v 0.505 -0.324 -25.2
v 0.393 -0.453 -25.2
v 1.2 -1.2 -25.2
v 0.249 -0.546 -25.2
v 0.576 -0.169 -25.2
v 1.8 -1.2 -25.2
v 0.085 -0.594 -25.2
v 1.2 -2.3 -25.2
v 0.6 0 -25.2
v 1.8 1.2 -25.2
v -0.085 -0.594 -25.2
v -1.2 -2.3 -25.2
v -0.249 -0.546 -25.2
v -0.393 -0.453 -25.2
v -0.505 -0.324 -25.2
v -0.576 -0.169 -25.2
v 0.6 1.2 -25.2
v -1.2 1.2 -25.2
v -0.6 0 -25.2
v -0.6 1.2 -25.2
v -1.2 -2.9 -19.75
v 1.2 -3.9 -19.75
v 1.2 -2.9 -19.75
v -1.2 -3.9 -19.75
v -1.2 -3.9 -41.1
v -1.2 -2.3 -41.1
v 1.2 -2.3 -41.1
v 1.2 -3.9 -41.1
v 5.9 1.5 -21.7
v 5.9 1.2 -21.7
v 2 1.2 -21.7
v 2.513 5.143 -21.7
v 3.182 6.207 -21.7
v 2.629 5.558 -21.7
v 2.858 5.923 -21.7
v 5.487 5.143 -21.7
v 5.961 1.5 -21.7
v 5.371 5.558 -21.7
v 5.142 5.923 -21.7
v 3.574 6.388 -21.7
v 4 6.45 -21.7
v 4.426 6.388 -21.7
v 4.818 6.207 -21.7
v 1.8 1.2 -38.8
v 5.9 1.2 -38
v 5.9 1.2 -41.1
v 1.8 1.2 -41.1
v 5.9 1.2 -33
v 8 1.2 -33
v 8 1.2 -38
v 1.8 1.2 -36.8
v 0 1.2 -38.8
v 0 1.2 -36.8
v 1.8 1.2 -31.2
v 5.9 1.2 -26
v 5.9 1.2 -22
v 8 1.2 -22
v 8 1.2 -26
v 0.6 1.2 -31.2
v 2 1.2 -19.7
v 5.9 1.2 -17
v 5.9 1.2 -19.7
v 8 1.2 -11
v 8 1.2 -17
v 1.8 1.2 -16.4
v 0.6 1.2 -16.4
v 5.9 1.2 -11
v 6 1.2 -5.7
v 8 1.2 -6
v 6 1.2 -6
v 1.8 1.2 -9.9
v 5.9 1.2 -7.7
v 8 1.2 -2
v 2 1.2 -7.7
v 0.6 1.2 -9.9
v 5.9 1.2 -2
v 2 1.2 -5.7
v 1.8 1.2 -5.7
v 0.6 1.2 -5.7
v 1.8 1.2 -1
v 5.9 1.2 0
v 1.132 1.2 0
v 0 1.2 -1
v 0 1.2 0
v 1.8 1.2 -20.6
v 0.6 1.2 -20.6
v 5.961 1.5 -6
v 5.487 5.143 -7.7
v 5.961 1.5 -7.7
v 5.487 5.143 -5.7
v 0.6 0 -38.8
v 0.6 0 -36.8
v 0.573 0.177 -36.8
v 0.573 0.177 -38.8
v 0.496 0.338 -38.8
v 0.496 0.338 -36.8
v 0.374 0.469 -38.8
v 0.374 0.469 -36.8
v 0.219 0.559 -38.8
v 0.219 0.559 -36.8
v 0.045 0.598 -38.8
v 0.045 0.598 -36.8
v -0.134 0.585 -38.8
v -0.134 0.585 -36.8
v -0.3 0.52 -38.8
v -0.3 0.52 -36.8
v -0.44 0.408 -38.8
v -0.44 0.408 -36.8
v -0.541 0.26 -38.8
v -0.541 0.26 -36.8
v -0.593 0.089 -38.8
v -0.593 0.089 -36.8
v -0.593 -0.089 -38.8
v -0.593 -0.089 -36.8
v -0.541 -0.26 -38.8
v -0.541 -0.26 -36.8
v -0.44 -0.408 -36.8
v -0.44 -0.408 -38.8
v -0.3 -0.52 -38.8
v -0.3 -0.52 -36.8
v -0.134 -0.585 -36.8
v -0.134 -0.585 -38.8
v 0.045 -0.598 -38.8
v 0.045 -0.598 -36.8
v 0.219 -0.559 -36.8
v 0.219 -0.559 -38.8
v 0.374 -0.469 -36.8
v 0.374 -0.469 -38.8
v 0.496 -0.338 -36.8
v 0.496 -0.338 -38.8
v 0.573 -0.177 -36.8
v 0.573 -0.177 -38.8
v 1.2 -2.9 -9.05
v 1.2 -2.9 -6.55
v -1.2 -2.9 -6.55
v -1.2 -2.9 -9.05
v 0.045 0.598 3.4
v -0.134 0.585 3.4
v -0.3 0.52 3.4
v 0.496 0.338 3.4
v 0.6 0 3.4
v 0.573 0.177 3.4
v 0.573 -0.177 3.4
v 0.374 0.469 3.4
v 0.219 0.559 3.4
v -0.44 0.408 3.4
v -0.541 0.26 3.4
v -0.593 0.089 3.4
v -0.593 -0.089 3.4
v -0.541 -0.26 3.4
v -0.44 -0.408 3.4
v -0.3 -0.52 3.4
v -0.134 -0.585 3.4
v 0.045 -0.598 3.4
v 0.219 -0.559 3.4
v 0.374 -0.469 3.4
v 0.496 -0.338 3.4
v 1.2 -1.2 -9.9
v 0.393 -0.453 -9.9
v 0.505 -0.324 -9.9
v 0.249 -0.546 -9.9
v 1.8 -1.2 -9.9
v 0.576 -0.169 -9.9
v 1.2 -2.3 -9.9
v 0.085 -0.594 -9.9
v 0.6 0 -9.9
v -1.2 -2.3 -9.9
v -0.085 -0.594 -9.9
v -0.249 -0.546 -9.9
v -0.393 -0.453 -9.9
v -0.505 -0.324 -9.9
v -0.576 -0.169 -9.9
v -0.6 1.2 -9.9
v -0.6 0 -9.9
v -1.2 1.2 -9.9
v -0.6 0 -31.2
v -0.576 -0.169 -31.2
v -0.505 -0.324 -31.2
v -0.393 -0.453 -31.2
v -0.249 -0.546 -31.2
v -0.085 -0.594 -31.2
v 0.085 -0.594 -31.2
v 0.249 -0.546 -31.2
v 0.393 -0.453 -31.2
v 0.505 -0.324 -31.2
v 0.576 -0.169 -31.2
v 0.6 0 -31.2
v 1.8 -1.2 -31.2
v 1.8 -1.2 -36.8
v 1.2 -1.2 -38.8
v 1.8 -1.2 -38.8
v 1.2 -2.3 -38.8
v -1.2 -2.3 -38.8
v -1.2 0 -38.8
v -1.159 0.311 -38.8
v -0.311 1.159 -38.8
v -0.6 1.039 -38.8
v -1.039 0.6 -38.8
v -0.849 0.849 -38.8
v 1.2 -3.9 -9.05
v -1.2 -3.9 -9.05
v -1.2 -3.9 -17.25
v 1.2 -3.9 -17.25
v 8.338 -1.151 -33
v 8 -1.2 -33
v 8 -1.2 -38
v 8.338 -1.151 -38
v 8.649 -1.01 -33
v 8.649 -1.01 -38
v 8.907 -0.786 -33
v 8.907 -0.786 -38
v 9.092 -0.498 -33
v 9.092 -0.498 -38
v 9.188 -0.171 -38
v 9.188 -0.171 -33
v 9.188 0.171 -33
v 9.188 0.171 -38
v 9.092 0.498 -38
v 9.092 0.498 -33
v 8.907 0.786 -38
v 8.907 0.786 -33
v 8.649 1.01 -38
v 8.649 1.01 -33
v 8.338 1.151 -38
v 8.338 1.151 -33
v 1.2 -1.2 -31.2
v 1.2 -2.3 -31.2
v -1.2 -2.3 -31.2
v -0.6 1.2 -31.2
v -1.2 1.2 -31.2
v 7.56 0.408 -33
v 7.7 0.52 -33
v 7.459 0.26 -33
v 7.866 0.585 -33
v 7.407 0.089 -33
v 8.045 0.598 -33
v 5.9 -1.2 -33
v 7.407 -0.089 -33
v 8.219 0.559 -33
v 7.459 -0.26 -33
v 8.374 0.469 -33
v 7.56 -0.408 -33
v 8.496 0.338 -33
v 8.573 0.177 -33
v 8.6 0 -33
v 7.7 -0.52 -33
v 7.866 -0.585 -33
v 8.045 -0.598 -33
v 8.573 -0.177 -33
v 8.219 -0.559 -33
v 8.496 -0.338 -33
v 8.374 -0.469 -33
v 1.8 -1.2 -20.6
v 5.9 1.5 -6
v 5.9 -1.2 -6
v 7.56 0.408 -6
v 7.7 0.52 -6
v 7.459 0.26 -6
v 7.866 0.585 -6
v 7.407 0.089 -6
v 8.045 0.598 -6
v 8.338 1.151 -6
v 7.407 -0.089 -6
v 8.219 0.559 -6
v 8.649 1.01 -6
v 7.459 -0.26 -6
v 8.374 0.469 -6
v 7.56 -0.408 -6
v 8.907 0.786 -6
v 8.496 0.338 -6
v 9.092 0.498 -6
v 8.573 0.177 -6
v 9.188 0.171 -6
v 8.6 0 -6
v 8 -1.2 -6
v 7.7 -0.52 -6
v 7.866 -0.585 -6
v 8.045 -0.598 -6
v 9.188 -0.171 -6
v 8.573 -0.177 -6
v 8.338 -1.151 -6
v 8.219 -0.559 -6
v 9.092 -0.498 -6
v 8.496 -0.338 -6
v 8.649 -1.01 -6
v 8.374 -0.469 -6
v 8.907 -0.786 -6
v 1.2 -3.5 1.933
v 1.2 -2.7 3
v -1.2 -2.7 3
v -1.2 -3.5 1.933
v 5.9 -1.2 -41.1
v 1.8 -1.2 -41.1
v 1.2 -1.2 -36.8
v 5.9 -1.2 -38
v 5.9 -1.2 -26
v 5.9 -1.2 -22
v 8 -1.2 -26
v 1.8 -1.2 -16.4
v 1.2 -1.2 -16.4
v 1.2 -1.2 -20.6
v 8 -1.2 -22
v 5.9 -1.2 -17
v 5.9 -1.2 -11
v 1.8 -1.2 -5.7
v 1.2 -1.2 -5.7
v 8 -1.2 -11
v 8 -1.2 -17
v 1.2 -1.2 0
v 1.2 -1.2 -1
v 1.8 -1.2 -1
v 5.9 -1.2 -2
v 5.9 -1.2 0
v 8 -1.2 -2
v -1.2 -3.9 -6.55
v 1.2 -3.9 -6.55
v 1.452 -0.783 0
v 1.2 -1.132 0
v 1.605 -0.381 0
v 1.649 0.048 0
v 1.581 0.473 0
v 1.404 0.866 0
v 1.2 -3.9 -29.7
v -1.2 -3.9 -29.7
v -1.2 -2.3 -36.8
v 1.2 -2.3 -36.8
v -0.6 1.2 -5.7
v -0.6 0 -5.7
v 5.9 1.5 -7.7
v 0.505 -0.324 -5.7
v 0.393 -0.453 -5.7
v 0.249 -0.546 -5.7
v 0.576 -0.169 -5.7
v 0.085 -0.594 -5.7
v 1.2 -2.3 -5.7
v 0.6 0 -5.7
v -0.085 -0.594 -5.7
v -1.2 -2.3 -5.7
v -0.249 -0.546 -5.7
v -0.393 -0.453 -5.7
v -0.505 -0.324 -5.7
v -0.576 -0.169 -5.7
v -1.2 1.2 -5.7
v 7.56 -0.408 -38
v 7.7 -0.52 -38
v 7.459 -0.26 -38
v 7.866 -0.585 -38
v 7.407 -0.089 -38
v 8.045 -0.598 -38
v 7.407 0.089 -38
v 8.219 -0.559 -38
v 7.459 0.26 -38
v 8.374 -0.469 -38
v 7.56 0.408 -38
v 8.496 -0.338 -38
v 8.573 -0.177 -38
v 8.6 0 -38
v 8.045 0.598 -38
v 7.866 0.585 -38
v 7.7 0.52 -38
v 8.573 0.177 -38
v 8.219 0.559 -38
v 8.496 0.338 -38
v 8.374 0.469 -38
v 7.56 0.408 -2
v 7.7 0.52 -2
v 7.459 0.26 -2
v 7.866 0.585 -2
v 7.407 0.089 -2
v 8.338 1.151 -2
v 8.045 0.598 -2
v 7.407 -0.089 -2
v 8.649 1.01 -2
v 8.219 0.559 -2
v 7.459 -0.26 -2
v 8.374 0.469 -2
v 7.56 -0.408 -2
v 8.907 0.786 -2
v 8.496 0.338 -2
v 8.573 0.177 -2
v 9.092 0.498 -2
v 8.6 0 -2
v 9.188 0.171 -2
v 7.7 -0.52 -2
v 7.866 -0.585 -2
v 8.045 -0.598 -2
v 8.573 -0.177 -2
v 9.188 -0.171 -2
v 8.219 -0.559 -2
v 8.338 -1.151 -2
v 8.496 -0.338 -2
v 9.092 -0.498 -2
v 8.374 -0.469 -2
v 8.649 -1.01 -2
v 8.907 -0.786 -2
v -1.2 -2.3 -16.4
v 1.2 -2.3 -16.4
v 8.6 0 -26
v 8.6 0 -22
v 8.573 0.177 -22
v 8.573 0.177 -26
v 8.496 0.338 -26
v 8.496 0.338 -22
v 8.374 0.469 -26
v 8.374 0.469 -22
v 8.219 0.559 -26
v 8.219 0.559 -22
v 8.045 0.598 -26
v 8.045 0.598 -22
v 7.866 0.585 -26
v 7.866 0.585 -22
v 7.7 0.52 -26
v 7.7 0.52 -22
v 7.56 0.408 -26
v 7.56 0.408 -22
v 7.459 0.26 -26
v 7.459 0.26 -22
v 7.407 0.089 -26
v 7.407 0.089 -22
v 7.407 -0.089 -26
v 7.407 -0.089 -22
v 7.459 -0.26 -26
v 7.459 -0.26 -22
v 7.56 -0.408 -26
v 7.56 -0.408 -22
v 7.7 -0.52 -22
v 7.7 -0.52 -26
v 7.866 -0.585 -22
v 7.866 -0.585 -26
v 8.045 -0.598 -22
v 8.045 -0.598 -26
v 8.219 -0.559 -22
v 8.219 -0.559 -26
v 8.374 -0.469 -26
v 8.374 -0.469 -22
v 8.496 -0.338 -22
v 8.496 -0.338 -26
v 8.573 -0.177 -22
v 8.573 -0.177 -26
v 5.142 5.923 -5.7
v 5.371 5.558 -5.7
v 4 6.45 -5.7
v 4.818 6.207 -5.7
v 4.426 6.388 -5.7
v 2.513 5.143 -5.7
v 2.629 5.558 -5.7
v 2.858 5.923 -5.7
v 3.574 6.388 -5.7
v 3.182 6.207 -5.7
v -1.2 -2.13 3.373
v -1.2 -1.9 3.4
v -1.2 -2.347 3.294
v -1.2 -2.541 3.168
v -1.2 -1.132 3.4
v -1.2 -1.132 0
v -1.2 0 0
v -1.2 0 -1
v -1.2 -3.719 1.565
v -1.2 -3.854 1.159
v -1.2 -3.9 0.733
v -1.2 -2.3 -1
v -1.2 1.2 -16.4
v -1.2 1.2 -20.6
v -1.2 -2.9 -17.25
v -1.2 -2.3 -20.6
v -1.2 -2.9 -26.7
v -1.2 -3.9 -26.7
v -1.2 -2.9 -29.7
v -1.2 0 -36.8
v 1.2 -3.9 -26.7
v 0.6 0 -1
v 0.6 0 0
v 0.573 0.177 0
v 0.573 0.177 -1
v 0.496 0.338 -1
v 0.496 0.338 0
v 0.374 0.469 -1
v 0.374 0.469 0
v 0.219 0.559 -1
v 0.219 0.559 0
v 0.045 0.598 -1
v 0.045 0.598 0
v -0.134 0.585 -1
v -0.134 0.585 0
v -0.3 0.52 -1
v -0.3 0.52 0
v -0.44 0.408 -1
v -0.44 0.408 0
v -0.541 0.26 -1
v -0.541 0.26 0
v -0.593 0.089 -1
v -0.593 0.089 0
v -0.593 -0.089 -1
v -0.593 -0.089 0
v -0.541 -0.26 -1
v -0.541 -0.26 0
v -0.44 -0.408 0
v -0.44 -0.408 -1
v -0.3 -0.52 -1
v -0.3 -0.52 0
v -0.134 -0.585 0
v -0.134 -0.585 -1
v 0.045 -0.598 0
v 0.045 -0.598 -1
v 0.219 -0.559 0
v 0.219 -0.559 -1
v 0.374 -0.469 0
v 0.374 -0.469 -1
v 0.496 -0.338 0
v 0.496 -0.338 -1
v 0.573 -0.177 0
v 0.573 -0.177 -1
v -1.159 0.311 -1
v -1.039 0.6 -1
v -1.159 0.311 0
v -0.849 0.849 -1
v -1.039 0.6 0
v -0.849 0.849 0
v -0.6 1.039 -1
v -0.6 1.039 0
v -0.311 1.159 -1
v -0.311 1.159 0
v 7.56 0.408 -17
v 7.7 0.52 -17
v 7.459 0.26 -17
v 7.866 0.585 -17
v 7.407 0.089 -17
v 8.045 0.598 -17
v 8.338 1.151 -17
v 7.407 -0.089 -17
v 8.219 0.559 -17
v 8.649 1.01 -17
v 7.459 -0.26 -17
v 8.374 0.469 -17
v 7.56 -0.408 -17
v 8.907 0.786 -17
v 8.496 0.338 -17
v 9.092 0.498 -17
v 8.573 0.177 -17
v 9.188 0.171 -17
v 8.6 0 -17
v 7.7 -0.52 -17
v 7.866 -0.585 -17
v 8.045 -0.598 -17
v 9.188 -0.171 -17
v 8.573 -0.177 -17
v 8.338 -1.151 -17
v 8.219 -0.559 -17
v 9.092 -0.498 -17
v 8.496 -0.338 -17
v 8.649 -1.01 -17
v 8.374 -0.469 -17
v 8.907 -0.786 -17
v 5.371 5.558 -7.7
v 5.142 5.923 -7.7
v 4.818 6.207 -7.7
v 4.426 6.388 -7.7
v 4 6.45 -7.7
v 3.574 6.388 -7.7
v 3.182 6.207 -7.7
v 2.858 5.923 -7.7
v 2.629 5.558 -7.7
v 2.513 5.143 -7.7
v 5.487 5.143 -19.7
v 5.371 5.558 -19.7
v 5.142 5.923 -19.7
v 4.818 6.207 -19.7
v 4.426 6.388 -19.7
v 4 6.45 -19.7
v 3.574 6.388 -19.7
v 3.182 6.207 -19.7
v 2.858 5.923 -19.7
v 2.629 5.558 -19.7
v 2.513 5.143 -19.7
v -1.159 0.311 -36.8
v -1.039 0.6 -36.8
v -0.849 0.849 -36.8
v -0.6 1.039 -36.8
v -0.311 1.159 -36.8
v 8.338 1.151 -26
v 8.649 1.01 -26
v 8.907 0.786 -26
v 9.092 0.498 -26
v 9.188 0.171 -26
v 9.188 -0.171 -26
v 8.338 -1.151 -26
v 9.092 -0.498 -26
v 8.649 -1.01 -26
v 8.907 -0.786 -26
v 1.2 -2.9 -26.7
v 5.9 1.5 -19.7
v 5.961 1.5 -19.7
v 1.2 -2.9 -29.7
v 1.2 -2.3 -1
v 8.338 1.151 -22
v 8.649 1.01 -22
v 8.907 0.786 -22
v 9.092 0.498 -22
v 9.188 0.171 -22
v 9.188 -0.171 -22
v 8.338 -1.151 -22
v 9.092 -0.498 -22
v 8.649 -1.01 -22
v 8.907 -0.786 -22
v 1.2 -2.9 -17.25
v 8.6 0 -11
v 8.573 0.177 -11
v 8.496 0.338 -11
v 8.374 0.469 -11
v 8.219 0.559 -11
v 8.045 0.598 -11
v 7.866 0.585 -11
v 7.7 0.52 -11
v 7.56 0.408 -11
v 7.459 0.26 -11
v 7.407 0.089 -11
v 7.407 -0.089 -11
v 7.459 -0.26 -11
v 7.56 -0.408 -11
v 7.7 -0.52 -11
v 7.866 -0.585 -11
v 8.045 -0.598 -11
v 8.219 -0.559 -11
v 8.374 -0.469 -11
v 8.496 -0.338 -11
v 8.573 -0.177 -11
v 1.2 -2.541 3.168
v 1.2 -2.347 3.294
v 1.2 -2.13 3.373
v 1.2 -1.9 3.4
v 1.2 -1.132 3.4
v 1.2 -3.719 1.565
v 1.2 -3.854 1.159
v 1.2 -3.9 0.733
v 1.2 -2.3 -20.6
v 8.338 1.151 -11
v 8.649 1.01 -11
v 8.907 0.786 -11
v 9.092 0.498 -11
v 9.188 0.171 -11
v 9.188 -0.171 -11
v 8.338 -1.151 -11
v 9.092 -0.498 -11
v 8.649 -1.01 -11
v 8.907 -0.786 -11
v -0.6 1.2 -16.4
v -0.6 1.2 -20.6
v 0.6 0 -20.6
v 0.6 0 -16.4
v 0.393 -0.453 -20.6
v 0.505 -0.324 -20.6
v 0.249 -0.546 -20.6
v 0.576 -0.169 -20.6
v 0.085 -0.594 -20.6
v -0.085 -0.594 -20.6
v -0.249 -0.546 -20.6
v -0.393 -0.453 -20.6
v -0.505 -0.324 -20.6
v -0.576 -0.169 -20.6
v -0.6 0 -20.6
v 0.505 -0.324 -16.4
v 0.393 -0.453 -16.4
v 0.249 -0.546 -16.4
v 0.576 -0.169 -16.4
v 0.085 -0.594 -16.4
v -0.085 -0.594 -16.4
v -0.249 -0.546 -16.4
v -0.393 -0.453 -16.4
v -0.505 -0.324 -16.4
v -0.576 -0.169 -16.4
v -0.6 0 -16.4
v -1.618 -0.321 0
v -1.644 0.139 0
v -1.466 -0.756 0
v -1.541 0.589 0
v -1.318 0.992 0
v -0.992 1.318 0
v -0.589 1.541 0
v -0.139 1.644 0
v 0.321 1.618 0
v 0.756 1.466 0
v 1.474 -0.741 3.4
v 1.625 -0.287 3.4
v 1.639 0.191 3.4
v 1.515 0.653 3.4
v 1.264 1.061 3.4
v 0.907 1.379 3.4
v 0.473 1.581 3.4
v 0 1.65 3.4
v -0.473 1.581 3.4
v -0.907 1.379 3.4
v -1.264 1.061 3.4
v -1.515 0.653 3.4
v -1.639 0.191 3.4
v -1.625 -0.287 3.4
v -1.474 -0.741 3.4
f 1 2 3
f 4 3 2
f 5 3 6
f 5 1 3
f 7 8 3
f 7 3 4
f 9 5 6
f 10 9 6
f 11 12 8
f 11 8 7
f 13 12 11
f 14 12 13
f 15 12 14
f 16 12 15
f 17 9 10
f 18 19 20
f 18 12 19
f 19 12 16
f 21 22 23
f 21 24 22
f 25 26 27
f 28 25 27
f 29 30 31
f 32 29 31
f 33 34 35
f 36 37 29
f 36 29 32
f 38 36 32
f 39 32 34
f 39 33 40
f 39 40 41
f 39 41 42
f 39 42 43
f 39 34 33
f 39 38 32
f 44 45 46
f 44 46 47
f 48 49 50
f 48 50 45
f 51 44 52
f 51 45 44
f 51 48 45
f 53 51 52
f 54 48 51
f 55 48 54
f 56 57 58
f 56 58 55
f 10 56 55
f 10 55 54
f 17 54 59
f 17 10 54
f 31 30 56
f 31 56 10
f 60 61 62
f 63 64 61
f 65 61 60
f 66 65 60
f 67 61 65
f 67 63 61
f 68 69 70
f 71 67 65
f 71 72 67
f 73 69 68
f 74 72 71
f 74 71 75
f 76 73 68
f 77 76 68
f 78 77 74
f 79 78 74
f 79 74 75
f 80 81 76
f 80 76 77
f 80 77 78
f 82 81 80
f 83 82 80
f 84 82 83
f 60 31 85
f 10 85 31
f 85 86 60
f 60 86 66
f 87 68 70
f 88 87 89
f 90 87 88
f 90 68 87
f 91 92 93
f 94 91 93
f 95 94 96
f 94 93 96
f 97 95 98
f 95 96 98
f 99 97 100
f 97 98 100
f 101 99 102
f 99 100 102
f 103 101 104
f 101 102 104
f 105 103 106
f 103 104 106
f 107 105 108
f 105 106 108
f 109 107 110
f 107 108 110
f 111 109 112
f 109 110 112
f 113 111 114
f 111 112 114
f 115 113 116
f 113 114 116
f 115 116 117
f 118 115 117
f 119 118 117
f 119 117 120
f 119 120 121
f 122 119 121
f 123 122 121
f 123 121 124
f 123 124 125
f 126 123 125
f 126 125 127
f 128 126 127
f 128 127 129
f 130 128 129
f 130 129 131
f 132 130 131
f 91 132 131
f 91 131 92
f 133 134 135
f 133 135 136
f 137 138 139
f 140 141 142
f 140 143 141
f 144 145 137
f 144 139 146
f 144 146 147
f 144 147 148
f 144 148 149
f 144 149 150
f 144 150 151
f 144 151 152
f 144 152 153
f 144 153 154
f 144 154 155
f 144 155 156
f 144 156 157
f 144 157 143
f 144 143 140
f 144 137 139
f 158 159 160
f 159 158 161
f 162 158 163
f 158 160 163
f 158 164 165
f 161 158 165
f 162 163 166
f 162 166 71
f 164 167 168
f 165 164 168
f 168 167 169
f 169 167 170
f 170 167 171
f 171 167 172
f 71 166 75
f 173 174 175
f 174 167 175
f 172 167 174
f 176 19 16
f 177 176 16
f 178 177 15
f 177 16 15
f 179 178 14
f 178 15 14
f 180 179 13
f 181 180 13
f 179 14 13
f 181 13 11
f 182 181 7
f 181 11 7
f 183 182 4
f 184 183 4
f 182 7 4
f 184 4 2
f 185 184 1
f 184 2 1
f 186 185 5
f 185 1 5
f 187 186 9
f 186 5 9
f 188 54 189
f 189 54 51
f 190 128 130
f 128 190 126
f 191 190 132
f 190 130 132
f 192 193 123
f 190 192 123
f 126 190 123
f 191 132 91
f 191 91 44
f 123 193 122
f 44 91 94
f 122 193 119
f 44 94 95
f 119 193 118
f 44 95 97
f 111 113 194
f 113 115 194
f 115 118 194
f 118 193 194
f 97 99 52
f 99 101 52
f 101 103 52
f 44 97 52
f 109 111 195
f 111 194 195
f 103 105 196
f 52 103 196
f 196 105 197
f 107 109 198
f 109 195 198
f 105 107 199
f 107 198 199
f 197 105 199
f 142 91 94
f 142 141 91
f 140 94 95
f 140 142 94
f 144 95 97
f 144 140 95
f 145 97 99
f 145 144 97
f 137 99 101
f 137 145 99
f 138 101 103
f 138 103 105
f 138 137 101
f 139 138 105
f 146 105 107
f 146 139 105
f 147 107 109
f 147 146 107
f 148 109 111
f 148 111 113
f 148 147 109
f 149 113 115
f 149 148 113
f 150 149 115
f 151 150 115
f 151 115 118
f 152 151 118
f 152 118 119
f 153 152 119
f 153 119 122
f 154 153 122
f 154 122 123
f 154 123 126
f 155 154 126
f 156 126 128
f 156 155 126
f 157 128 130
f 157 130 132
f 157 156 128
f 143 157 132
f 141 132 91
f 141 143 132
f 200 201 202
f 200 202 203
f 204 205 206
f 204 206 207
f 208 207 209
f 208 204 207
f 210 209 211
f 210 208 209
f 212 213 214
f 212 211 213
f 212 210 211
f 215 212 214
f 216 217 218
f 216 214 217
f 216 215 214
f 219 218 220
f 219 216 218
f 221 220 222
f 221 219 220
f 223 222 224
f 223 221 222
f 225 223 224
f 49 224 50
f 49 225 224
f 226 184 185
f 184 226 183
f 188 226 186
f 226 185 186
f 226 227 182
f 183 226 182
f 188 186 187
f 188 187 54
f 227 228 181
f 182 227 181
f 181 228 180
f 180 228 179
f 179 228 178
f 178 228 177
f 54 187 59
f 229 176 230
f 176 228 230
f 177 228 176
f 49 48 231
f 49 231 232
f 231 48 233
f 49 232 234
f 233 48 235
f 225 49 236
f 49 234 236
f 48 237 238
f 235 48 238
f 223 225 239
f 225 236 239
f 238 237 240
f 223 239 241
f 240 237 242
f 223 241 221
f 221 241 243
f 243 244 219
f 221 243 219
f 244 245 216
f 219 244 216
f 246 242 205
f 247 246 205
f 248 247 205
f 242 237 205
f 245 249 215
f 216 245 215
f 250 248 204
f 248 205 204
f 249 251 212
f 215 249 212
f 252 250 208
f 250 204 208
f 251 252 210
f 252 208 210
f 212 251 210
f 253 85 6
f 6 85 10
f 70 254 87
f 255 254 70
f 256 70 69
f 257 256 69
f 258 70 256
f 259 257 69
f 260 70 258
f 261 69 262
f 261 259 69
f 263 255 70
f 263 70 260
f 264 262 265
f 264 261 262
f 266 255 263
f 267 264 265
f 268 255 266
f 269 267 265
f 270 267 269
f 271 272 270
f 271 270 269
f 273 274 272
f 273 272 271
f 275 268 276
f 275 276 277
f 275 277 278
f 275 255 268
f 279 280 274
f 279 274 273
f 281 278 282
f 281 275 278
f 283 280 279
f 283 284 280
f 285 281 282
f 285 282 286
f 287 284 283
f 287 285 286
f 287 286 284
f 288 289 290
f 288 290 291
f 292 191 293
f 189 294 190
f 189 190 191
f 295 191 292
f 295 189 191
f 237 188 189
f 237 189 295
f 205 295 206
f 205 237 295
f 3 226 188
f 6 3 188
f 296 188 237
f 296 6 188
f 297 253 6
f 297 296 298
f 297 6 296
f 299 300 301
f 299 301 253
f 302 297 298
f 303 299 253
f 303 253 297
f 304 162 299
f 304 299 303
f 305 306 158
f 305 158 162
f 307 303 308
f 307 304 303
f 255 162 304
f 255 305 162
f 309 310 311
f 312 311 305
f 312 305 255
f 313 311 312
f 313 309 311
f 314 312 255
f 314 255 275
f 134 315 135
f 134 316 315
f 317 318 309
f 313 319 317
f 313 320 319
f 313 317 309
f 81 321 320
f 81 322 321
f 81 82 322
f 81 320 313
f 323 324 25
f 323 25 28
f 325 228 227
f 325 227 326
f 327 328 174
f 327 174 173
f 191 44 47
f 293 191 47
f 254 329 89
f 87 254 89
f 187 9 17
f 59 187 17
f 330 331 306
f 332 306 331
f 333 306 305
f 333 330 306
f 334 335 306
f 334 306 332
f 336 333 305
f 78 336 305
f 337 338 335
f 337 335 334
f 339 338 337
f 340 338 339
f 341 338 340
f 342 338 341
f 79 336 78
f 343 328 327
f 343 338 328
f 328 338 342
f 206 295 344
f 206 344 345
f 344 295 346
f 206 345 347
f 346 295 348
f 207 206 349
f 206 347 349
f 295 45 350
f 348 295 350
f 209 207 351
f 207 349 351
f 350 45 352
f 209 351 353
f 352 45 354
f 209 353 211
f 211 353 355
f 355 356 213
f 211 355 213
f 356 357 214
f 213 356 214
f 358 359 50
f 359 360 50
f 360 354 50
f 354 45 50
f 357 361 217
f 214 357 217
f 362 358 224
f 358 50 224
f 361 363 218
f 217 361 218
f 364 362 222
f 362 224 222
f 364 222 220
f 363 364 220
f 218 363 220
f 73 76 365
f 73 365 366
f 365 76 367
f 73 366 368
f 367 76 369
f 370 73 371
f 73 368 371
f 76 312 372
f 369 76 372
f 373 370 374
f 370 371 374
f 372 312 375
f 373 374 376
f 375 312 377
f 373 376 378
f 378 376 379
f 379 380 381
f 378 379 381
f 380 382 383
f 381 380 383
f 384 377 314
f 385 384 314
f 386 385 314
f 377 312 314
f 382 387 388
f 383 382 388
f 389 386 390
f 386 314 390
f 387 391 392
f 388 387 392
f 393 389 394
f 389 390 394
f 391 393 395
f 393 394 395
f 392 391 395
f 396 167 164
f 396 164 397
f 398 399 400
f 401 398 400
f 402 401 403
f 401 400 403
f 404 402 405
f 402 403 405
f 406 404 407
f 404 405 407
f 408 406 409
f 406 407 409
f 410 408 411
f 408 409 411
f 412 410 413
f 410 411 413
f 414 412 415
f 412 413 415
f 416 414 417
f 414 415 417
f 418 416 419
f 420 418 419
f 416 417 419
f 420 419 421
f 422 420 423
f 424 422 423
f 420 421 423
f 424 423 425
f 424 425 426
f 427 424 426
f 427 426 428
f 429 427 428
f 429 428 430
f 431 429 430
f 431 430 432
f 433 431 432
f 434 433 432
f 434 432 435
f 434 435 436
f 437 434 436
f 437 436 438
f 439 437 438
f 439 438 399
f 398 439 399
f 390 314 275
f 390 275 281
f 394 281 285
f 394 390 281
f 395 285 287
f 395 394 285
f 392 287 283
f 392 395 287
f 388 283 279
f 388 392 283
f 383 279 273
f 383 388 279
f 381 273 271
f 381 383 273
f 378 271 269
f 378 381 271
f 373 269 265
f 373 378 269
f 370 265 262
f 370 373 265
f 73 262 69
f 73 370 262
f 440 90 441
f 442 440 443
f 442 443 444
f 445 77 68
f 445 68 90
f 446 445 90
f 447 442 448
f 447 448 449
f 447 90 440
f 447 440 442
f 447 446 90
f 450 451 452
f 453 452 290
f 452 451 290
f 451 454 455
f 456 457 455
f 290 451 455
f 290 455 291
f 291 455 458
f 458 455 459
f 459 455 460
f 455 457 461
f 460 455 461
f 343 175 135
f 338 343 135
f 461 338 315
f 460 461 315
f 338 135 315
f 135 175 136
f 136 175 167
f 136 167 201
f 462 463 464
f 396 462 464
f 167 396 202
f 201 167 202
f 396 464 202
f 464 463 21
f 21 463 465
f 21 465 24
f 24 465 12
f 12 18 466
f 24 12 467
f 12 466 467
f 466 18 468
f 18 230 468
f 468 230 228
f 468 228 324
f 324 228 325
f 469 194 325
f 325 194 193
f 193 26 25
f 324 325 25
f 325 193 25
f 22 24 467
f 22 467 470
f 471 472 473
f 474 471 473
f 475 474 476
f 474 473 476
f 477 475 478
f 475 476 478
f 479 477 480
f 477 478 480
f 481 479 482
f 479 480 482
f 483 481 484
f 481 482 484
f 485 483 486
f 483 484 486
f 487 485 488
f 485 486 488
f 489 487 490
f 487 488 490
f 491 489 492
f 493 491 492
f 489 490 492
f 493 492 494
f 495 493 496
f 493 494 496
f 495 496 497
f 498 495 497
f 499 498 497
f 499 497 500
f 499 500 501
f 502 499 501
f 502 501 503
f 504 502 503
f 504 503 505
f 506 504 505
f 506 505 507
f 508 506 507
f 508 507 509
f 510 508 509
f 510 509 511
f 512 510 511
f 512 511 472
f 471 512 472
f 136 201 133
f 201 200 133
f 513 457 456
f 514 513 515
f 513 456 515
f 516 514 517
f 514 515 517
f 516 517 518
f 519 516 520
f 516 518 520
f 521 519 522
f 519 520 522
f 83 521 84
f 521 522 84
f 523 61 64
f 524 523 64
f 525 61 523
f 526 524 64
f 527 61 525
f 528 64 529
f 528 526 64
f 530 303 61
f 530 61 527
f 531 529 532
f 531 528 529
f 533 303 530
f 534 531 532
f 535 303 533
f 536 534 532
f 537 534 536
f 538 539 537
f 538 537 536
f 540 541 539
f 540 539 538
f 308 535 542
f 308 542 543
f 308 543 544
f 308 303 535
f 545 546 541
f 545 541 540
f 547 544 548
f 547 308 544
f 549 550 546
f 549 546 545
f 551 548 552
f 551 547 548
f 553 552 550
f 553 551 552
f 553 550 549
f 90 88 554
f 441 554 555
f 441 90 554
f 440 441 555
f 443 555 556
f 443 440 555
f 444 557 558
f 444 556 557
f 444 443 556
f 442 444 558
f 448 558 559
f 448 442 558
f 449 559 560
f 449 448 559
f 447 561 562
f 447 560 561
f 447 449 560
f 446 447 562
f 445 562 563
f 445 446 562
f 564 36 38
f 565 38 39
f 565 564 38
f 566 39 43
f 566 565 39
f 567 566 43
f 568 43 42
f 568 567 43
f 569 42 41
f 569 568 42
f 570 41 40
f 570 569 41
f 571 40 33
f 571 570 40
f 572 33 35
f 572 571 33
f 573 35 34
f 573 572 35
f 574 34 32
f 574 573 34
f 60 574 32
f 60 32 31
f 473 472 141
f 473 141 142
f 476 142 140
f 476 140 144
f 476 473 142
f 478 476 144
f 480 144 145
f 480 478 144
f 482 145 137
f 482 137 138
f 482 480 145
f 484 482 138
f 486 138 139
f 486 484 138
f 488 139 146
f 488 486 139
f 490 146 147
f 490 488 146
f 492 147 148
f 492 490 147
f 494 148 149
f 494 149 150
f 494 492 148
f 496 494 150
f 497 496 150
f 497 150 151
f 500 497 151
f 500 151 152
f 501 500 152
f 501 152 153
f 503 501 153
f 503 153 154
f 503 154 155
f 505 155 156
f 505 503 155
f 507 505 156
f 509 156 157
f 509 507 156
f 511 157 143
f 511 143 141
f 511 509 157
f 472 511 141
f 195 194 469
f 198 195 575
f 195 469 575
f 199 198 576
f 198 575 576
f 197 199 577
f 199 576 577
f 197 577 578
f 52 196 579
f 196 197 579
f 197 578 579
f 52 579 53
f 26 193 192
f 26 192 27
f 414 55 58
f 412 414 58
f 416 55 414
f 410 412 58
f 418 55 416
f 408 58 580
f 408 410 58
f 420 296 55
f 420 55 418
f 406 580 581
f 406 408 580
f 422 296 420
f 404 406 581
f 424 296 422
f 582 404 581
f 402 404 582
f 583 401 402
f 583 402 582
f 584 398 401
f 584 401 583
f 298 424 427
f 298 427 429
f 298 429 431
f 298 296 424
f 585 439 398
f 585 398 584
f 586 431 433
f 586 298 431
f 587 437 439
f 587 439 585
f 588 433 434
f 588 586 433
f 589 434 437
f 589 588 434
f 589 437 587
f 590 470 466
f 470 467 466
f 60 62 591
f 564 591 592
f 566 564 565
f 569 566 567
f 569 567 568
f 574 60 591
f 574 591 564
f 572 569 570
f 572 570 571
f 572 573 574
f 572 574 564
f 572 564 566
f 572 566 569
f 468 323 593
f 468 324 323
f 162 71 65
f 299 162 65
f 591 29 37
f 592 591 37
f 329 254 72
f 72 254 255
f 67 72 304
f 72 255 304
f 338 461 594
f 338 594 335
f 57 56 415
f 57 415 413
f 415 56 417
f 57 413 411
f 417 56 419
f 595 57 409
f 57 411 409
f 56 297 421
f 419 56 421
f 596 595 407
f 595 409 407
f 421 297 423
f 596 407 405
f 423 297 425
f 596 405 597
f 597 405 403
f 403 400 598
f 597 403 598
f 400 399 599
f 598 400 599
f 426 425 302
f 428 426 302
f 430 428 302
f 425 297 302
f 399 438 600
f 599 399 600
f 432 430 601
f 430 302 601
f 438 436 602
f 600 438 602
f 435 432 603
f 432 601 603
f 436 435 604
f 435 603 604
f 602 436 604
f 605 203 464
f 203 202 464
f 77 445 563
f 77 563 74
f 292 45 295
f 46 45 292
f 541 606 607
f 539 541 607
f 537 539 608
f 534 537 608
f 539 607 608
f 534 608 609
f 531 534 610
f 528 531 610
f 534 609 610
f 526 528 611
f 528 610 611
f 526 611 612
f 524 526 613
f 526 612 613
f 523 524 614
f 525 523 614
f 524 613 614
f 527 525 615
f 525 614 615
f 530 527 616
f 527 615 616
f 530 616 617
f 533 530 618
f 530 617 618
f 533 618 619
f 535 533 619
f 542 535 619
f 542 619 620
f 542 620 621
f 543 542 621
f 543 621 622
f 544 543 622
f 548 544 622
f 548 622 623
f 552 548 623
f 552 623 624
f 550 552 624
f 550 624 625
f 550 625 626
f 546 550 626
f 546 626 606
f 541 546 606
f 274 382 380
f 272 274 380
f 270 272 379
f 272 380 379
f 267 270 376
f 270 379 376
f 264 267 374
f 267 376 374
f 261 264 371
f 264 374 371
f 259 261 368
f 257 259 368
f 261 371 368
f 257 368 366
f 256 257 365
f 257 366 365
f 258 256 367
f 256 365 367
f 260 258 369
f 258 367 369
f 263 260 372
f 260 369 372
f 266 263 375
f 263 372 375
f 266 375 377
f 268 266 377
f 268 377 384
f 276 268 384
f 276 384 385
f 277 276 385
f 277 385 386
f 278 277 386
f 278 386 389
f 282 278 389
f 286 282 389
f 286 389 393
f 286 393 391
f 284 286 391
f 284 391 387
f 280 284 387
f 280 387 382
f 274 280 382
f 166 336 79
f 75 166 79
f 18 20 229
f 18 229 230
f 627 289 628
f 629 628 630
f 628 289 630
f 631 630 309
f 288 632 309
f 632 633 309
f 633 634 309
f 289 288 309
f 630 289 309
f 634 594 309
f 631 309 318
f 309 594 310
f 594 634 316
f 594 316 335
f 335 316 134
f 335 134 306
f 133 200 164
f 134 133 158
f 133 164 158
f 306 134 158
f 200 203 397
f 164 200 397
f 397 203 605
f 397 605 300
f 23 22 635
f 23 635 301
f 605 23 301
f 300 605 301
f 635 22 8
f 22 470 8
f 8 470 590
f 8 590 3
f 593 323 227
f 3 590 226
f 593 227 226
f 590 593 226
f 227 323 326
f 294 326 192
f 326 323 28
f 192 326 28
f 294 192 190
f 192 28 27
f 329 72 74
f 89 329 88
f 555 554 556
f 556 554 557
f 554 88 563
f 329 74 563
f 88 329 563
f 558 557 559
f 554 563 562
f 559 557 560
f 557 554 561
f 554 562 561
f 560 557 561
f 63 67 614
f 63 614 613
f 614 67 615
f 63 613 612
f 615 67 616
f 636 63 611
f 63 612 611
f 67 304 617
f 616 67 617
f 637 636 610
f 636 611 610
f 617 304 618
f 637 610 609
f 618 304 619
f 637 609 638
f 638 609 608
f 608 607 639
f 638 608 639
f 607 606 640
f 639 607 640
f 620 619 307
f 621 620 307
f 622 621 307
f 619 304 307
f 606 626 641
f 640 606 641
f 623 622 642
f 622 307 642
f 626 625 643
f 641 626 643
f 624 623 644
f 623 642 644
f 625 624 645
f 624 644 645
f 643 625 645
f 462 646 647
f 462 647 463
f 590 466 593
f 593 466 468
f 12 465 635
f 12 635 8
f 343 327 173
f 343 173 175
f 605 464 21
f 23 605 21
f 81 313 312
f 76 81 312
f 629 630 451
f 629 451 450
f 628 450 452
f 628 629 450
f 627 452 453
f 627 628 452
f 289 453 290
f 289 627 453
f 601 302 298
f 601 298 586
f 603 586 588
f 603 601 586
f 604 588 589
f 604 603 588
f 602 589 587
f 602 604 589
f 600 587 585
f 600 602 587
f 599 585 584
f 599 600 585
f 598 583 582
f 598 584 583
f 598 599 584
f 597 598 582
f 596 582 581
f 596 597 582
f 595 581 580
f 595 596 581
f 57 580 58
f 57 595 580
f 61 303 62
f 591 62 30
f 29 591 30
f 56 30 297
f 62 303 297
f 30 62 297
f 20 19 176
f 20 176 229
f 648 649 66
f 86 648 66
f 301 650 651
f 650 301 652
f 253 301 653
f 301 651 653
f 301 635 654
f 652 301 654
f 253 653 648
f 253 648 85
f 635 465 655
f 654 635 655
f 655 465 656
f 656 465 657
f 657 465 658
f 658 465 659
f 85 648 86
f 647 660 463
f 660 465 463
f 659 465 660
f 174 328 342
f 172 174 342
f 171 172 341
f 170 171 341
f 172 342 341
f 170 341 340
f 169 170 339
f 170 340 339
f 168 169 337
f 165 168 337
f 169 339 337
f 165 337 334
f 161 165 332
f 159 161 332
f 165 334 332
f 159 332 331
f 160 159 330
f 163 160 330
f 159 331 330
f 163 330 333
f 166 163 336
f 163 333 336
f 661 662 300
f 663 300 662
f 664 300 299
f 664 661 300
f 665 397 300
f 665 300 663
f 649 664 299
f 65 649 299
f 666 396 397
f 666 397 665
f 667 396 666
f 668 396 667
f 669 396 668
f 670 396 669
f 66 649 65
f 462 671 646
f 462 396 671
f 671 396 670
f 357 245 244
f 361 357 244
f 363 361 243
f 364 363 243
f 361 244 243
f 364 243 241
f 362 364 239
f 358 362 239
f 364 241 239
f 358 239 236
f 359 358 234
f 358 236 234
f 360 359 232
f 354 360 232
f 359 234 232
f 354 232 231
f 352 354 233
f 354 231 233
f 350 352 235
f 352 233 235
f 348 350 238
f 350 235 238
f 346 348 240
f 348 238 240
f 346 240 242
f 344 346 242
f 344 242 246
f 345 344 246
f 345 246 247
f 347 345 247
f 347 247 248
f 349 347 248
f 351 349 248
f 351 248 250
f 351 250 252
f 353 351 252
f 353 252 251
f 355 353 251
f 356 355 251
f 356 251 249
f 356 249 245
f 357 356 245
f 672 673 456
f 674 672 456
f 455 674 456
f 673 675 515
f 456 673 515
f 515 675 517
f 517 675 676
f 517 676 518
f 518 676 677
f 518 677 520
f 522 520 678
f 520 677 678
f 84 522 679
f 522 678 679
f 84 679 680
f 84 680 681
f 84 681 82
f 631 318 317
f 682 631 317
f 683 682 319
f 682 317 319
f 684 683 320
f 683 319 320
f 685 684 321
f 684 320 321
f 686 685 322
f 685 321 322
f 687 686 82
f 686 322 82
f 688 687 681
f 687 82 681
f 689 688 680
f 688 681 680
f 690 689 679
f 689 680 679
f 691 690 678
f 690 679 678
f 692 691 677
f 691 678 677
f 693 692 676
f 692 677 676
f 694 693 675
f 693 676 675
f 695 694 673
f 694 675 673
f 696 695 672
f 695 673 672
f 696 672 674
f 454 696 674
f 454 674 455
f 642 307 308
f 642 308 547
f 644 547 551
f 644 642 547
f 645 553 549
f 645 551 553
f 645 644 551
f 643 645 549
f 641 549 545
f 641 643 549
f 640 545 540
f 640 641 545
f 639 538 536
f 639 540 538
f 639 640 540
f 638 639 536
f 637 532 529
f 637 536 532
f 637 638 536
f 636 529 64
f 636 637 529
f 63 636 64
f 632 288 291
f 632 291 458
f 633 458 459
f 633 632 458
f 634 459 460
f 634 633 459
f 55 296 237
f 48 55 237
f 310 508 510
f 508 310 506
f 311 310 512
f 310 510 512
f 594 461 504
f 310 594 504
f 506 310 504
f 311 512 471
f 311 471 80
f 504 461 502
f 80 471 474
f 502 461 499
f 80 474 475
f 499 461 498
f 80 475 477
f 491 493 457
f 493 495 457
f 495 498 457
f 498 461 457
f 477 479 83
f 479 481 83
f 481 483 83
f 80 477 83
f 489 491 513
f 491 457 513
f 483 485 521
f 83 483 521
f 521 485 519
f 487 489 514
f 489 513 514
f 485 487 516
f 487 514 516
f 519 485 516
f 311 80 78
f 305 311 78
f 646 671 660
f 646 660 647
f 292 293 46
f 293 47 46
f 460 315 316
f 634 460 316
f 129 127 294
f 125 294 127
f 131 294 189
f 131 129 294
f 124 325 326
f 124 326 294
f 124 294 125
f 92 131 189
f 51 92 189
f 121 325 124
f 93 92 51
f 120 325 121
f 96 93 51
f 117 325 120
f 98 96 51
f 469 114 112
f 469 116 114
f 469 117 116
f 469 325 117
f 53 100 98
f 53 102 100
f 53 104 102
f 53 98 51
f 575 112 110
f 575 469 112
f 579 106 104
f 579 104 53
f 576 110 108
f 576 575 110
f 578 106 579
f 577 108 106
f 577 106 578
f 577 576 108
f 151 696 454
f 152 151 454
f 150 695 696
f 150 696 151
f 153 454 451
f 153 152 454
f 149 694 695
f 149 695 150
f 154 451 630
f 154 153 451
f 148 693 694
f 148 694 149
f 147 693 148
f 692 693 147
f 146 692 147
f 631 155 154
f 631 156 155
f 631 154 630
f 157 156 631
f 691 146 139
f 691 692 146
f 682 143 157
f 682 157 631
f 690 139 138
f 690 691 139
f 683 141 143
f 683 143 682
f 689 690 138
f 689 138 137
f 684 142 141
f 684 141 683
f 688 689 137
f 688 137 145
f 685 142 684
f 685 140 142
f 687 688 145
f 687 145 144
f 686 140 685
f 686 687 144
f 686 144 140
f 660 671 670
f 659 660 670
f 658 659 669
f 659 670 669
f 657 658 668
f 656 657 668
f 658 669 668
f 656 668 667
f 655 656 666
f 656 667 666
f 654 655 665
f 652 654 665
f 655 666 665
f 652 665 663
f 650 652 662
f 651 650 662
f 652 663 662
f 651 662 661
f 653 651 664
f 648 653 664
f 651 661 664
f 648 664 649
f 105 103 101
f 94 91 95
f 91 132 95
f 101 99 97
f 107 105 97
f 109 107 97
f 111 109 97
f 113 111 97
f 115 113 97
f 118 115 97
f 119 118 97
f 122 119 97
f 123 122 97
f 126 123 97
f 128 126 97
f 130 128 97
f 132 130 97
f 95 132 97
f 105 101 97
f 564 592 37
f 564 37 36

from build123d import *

# Parameters (mm, degrees)
SKETCH_1_R           = 0.6
EXTRUDE_1_DEPTH      = 41.1
SKETCH_2_W           = 5.7
SKETCH_2_H           = 5.25
SKETCH_2_W_2         = 12
SKETCH_2_W_3         = 19.4
CUT_EXTRUDE_1_DEPTH  = 9.75
CUT_EXTRUDE_START    = -1.2
SKETCH_6_W           = 4.7
SKETCH_6_H           = 3.5
SKETCH_6_W_2         = 6.5
SKETCH_6_W_3         = 4.6
SKETCH_6_W_4         = 5.6
SKETCH_6_W_5         = 2.3
CUT_EXTRUDE_4_DEPTH  = 3
CUT_EXTRUDE_5_DEPTH  = 3
CUT_EXTRUDE_START_2  = -36.8
CUT_EXTRUDE_6_DEPTH  = 3
CUT_EXTRUDE_START_3  = -5.7
SKETCH_11_W          = 1.2
SKETCH_11_H          = 1.2
CUT_EXTRUDE_7_DEPTH  = 27
SKETCH_12_W          = 3
SKETCH_12_H          = 4.320930259
SKETCH_12_W_2        = 2.5
CUT_EXTRUDE_8_DEPTH  = 3.5
SKETCH_13_W          = 3.3
SKETCH_13_H          = 2
SKETCH_13_H_2        = 5
SKETCH_13_H_3        = 7
SKETCH_13_H_4        = 3.1
CUT_EXTRUDE_9_DEPTH  = 1.5
SKETCH_14_R          = 1.65
SKETCH_14_R_2        = 0.6
EXTRUDE_2_DEPTH      = 3.4
CUT_EXTRUDE_10_DEPTH = 1.7
SKETCH_17_R          = 0.6
EXTRUDE_3_DEPTH      = 3.4
EXTRUDE_3_DEPTH_BACK = 38.8


with BuildPart() as part:
    # 草图1 → 凸台-拉伸1 (new body)
    with BuildSketch(Plane.XY):
        with BuildLine():
            Line((2, 1.2), (-1.2, 1.2))
            Line((-1.2, 1.2), (-1.2, -3.9))
            Line((-1.2, -3.9), (1.2, -3.9))
            Line((1.2, -3.9), (1.2, -1.2))
            Line((1.2, -1.2), (8, -1.2))
            ThreePointArc((8, -1.2), (9.2, 0), (8, 1.2))
            Line((8, 1.2), (6, 1.2))
            Line((6, 1.2), (5.487489304, 5.143327629))
            ThreePointArc((5.487489304, 5.143327629), (4, 6.45), (2.512510696, 5.143327629))
            Line((2.512510696, 5.143327629), (2, 1.2))
        make_face()
        Circle(SKETCH_1_R, mode=Mode.SUBTRACT)
        with Locations((8, 0)):
            Circle(SKETCH_1_R, mode=Mode.SUBTRACT)
    extrude(amount=-EXTRUDE_1_DEPTH)

    # 草图2 → 切除-拉伸1 (cut, symmetric)
    with BuildSketch(Plane(origin=(0, 0, 0), x_dir=(0, 0, -1), z_dir=(1, 0, 0))):
        with Locations((2.85, 3.825)):
            Rectangle(SKETCH_2_W, SKETCH_2_H)
        with Locations((13.7, 3.825)):
            Rectangle(SKETCH_2_W_2, SKETCH_2_H)
        with Locations((31.4, 3.825)):
            Rectangle(SKETCH_2_W_3, SKETCH_2_H)
    extrude(amount=CUT_EXTRUDE_1_DEPTH, both=True, mode=Mode.SUBTRACT)

    # 草图6 → 切除-拉伸4 (cut)
    with BuildSketch(Plane(origin=(0, 0, 0), x_dir=(0, 0, -1), z_dir=(1, 0, 0)).offset(CUT_EXTRUDE_START)):
        with Locations((3.35, -0.55)):
            Rectangle(SKETCH_6_W, SKETCH_6_H)
        with Locations((13.15, -0.55)):
            Rectangle(SKETCH_6_W_2, SKETCH_6_H)
        with Locations((22.9, -0.55)):
            Rectangle(SKETCH_6_W_3, SKETCH_6_H)
        with Locations((34, -0.55)):
            Rectangle(SKETCH_6_W_4, SKETCH_6_H)
        with Locations((39.95, -0.55)):
            Rectangle(SKETCH_6_W_5, SKETCH_6_H)
    extrude(amount=CUT_EXTRUDE_4_DEPTH, mode=Mode.SUBTRACT)

    # 草图9 → 切除-拉伸5 (cut)
    with BuildSketch(Plane.XY):
        with BuildLine():
            Line((0, 1.2), (-1.2, 1.2))
            Line((-1.2, 1.2), (-1.2, 0))
            ThreePointArc((-1.2, 0), (-0.848528137, 0.848528137), (0, 1.2))
        make_face()
    extrude(amount=-CUT_EXTRUDE_5_DEPTH, mode=Mode.SUBTRACT)

    # 草图9<3> → 切除-拉伸6 (cut)
    with BuildSketch(Plane.XY.offset(CUT_EXTRUDE_START_2)):
        with BuildLine():
            Line((0, 1.2), (-1.2, 1.2))
            Line((-1.2, 1.2), (-1.2, 0))
            ThreePointArc((-1.2, 0), (-0.848528137, 0.848528137), (0, 1.2))
        make_face()
    extrude(amount=-CUT_EXTRUDE_6_DEPTH, mode=Mode.SUBTRACT)

    # 草图11 → 切除-拉伸7 (cut)
    with BuildSketch(Plane.XY.offset(CUT_EXTRUDE_START_3)):
        with Locations((0, 0.6)):
            Rectangle(SKETCH_11_W, SKETCH_11_H)
    extrude(amount=-CUT_EXTRUDE_7_DEPTH, mode=Mode.SUBTRACT)

    # 草图12 → 切除-拉伸8 (cut, symmetric)
    with BuildSketch(Plane(origin=(0, 0, 0), x_dir=(0, 0, -1), z_dir=(1, 0, 0))):
        with Locations((28.2, -5.06046513)):
            Rectangle(SKETCH_12_W, SKETCH_12_H)
        with Locations((18.5, -5.06046513)):
            Rectangle(SKETCH_12_W_2, SKETCH_12_H)
        with Locations((7.8, -5.06046513)):
            Rectangle(SKETCH_12_W_2, SKETCH_12_H)
    extrude(amount=CUT_EXTRUDE_8_DEPTH, both=True, mode=Mode.SUBTRACT)

    # 草图13 → 切除-拉伸9 (cut, symmetric)
    with BuildSketch(Plane(origin=(0, 0, 0), x_dir=(1, 0, 0), z_dir=(0, 1, 0))):
        with Locations((7.55, 1)):
            Rectangle(SKETCH_13_W, SKETCH_13_H)
        with Locations((7.55, 8.5)):
            Rectangle(SKETCH_13_W, SKETCH_13_H_2)
        with Locations((7.55, 19.5)):
            Rectangle(SKETCH_13_W, SKETCH_13_H_2)
        with Locations((7.55, 29.5)):
            Rectangle(SKETCH_13_W, SKETCH_13_H_3)
        with Locations((7.55, 39.55)):
            Rectangle(SKETCH_13_W, SKETCH_13_H_4)
    extrude(amount=CUT_EXTRUDE_9_DEPTH, both=True, mode=Mode.SUBTRACT)

    # 草图14 → 凸台-拉伸2 (add)
    with BuildSketch(Plane.XY):
        Circle(SKETCH_14_R)
        Circle(SKETCH_14_R_2, mode=Mode.SUBTRACT)
        with BuildLine():
            ThreePointArc((1.2, -1.132475165), (0, -1.65), (-1.2, -1.132475165))
            Line((-1.2, -1.132475165), (-1.2, -3.9))
            Line((-1.2, -3.9), (1.2, -3.9))
            Line((1.2, -3.9), (1.2, -1.132475165))
        make_face()
    extrude(amount=EXTRUDE_2_DEPTH)

    # 草图15 → 切除-拉伸10 (cut, symmetric)
    with BuildSketch(Plane(origin=(0, 0, 0), x_dir=(0, 0, -1), z_dir=(1, 0, 0))):
        with BuildLine():
            ThreePointArc((-3.4, -1.9), (-3.294427191, -2.347213595), (-3, -2.7))
            Line((-3, -2.7), (-1.933333333, -3.5))
            ThreePointArc((-1.933333333, -3.5), (-1.365788865, -3.797366596), (-0.733333333, -3.9))
            Line((-0.733333333, -3.9), (-3.4, -3.9))
            Line((-3.4, -3.9), (-3.4, -1.9))
        make_face()
    extrude(amount=CUT_EXTRUDE_10_DEPTH, both=True, mode=Mode.SUBTRACT)


with BuildPart() as body_2:
    # 草图17 → 凸台-拉伸3 (new body, two sides)
    with BuildSketch(Plane.XY) as extrude_3_sk:
        Circle(SKETCH_17_R)
    extrude(amount=EXTRUDE_3_DEPTH)
    extrude(extrude_3_sk.sketch, amount=-EXTRUDE_3_DEPTH_BACK)


solid = Compound([part.part, body_2.part])
